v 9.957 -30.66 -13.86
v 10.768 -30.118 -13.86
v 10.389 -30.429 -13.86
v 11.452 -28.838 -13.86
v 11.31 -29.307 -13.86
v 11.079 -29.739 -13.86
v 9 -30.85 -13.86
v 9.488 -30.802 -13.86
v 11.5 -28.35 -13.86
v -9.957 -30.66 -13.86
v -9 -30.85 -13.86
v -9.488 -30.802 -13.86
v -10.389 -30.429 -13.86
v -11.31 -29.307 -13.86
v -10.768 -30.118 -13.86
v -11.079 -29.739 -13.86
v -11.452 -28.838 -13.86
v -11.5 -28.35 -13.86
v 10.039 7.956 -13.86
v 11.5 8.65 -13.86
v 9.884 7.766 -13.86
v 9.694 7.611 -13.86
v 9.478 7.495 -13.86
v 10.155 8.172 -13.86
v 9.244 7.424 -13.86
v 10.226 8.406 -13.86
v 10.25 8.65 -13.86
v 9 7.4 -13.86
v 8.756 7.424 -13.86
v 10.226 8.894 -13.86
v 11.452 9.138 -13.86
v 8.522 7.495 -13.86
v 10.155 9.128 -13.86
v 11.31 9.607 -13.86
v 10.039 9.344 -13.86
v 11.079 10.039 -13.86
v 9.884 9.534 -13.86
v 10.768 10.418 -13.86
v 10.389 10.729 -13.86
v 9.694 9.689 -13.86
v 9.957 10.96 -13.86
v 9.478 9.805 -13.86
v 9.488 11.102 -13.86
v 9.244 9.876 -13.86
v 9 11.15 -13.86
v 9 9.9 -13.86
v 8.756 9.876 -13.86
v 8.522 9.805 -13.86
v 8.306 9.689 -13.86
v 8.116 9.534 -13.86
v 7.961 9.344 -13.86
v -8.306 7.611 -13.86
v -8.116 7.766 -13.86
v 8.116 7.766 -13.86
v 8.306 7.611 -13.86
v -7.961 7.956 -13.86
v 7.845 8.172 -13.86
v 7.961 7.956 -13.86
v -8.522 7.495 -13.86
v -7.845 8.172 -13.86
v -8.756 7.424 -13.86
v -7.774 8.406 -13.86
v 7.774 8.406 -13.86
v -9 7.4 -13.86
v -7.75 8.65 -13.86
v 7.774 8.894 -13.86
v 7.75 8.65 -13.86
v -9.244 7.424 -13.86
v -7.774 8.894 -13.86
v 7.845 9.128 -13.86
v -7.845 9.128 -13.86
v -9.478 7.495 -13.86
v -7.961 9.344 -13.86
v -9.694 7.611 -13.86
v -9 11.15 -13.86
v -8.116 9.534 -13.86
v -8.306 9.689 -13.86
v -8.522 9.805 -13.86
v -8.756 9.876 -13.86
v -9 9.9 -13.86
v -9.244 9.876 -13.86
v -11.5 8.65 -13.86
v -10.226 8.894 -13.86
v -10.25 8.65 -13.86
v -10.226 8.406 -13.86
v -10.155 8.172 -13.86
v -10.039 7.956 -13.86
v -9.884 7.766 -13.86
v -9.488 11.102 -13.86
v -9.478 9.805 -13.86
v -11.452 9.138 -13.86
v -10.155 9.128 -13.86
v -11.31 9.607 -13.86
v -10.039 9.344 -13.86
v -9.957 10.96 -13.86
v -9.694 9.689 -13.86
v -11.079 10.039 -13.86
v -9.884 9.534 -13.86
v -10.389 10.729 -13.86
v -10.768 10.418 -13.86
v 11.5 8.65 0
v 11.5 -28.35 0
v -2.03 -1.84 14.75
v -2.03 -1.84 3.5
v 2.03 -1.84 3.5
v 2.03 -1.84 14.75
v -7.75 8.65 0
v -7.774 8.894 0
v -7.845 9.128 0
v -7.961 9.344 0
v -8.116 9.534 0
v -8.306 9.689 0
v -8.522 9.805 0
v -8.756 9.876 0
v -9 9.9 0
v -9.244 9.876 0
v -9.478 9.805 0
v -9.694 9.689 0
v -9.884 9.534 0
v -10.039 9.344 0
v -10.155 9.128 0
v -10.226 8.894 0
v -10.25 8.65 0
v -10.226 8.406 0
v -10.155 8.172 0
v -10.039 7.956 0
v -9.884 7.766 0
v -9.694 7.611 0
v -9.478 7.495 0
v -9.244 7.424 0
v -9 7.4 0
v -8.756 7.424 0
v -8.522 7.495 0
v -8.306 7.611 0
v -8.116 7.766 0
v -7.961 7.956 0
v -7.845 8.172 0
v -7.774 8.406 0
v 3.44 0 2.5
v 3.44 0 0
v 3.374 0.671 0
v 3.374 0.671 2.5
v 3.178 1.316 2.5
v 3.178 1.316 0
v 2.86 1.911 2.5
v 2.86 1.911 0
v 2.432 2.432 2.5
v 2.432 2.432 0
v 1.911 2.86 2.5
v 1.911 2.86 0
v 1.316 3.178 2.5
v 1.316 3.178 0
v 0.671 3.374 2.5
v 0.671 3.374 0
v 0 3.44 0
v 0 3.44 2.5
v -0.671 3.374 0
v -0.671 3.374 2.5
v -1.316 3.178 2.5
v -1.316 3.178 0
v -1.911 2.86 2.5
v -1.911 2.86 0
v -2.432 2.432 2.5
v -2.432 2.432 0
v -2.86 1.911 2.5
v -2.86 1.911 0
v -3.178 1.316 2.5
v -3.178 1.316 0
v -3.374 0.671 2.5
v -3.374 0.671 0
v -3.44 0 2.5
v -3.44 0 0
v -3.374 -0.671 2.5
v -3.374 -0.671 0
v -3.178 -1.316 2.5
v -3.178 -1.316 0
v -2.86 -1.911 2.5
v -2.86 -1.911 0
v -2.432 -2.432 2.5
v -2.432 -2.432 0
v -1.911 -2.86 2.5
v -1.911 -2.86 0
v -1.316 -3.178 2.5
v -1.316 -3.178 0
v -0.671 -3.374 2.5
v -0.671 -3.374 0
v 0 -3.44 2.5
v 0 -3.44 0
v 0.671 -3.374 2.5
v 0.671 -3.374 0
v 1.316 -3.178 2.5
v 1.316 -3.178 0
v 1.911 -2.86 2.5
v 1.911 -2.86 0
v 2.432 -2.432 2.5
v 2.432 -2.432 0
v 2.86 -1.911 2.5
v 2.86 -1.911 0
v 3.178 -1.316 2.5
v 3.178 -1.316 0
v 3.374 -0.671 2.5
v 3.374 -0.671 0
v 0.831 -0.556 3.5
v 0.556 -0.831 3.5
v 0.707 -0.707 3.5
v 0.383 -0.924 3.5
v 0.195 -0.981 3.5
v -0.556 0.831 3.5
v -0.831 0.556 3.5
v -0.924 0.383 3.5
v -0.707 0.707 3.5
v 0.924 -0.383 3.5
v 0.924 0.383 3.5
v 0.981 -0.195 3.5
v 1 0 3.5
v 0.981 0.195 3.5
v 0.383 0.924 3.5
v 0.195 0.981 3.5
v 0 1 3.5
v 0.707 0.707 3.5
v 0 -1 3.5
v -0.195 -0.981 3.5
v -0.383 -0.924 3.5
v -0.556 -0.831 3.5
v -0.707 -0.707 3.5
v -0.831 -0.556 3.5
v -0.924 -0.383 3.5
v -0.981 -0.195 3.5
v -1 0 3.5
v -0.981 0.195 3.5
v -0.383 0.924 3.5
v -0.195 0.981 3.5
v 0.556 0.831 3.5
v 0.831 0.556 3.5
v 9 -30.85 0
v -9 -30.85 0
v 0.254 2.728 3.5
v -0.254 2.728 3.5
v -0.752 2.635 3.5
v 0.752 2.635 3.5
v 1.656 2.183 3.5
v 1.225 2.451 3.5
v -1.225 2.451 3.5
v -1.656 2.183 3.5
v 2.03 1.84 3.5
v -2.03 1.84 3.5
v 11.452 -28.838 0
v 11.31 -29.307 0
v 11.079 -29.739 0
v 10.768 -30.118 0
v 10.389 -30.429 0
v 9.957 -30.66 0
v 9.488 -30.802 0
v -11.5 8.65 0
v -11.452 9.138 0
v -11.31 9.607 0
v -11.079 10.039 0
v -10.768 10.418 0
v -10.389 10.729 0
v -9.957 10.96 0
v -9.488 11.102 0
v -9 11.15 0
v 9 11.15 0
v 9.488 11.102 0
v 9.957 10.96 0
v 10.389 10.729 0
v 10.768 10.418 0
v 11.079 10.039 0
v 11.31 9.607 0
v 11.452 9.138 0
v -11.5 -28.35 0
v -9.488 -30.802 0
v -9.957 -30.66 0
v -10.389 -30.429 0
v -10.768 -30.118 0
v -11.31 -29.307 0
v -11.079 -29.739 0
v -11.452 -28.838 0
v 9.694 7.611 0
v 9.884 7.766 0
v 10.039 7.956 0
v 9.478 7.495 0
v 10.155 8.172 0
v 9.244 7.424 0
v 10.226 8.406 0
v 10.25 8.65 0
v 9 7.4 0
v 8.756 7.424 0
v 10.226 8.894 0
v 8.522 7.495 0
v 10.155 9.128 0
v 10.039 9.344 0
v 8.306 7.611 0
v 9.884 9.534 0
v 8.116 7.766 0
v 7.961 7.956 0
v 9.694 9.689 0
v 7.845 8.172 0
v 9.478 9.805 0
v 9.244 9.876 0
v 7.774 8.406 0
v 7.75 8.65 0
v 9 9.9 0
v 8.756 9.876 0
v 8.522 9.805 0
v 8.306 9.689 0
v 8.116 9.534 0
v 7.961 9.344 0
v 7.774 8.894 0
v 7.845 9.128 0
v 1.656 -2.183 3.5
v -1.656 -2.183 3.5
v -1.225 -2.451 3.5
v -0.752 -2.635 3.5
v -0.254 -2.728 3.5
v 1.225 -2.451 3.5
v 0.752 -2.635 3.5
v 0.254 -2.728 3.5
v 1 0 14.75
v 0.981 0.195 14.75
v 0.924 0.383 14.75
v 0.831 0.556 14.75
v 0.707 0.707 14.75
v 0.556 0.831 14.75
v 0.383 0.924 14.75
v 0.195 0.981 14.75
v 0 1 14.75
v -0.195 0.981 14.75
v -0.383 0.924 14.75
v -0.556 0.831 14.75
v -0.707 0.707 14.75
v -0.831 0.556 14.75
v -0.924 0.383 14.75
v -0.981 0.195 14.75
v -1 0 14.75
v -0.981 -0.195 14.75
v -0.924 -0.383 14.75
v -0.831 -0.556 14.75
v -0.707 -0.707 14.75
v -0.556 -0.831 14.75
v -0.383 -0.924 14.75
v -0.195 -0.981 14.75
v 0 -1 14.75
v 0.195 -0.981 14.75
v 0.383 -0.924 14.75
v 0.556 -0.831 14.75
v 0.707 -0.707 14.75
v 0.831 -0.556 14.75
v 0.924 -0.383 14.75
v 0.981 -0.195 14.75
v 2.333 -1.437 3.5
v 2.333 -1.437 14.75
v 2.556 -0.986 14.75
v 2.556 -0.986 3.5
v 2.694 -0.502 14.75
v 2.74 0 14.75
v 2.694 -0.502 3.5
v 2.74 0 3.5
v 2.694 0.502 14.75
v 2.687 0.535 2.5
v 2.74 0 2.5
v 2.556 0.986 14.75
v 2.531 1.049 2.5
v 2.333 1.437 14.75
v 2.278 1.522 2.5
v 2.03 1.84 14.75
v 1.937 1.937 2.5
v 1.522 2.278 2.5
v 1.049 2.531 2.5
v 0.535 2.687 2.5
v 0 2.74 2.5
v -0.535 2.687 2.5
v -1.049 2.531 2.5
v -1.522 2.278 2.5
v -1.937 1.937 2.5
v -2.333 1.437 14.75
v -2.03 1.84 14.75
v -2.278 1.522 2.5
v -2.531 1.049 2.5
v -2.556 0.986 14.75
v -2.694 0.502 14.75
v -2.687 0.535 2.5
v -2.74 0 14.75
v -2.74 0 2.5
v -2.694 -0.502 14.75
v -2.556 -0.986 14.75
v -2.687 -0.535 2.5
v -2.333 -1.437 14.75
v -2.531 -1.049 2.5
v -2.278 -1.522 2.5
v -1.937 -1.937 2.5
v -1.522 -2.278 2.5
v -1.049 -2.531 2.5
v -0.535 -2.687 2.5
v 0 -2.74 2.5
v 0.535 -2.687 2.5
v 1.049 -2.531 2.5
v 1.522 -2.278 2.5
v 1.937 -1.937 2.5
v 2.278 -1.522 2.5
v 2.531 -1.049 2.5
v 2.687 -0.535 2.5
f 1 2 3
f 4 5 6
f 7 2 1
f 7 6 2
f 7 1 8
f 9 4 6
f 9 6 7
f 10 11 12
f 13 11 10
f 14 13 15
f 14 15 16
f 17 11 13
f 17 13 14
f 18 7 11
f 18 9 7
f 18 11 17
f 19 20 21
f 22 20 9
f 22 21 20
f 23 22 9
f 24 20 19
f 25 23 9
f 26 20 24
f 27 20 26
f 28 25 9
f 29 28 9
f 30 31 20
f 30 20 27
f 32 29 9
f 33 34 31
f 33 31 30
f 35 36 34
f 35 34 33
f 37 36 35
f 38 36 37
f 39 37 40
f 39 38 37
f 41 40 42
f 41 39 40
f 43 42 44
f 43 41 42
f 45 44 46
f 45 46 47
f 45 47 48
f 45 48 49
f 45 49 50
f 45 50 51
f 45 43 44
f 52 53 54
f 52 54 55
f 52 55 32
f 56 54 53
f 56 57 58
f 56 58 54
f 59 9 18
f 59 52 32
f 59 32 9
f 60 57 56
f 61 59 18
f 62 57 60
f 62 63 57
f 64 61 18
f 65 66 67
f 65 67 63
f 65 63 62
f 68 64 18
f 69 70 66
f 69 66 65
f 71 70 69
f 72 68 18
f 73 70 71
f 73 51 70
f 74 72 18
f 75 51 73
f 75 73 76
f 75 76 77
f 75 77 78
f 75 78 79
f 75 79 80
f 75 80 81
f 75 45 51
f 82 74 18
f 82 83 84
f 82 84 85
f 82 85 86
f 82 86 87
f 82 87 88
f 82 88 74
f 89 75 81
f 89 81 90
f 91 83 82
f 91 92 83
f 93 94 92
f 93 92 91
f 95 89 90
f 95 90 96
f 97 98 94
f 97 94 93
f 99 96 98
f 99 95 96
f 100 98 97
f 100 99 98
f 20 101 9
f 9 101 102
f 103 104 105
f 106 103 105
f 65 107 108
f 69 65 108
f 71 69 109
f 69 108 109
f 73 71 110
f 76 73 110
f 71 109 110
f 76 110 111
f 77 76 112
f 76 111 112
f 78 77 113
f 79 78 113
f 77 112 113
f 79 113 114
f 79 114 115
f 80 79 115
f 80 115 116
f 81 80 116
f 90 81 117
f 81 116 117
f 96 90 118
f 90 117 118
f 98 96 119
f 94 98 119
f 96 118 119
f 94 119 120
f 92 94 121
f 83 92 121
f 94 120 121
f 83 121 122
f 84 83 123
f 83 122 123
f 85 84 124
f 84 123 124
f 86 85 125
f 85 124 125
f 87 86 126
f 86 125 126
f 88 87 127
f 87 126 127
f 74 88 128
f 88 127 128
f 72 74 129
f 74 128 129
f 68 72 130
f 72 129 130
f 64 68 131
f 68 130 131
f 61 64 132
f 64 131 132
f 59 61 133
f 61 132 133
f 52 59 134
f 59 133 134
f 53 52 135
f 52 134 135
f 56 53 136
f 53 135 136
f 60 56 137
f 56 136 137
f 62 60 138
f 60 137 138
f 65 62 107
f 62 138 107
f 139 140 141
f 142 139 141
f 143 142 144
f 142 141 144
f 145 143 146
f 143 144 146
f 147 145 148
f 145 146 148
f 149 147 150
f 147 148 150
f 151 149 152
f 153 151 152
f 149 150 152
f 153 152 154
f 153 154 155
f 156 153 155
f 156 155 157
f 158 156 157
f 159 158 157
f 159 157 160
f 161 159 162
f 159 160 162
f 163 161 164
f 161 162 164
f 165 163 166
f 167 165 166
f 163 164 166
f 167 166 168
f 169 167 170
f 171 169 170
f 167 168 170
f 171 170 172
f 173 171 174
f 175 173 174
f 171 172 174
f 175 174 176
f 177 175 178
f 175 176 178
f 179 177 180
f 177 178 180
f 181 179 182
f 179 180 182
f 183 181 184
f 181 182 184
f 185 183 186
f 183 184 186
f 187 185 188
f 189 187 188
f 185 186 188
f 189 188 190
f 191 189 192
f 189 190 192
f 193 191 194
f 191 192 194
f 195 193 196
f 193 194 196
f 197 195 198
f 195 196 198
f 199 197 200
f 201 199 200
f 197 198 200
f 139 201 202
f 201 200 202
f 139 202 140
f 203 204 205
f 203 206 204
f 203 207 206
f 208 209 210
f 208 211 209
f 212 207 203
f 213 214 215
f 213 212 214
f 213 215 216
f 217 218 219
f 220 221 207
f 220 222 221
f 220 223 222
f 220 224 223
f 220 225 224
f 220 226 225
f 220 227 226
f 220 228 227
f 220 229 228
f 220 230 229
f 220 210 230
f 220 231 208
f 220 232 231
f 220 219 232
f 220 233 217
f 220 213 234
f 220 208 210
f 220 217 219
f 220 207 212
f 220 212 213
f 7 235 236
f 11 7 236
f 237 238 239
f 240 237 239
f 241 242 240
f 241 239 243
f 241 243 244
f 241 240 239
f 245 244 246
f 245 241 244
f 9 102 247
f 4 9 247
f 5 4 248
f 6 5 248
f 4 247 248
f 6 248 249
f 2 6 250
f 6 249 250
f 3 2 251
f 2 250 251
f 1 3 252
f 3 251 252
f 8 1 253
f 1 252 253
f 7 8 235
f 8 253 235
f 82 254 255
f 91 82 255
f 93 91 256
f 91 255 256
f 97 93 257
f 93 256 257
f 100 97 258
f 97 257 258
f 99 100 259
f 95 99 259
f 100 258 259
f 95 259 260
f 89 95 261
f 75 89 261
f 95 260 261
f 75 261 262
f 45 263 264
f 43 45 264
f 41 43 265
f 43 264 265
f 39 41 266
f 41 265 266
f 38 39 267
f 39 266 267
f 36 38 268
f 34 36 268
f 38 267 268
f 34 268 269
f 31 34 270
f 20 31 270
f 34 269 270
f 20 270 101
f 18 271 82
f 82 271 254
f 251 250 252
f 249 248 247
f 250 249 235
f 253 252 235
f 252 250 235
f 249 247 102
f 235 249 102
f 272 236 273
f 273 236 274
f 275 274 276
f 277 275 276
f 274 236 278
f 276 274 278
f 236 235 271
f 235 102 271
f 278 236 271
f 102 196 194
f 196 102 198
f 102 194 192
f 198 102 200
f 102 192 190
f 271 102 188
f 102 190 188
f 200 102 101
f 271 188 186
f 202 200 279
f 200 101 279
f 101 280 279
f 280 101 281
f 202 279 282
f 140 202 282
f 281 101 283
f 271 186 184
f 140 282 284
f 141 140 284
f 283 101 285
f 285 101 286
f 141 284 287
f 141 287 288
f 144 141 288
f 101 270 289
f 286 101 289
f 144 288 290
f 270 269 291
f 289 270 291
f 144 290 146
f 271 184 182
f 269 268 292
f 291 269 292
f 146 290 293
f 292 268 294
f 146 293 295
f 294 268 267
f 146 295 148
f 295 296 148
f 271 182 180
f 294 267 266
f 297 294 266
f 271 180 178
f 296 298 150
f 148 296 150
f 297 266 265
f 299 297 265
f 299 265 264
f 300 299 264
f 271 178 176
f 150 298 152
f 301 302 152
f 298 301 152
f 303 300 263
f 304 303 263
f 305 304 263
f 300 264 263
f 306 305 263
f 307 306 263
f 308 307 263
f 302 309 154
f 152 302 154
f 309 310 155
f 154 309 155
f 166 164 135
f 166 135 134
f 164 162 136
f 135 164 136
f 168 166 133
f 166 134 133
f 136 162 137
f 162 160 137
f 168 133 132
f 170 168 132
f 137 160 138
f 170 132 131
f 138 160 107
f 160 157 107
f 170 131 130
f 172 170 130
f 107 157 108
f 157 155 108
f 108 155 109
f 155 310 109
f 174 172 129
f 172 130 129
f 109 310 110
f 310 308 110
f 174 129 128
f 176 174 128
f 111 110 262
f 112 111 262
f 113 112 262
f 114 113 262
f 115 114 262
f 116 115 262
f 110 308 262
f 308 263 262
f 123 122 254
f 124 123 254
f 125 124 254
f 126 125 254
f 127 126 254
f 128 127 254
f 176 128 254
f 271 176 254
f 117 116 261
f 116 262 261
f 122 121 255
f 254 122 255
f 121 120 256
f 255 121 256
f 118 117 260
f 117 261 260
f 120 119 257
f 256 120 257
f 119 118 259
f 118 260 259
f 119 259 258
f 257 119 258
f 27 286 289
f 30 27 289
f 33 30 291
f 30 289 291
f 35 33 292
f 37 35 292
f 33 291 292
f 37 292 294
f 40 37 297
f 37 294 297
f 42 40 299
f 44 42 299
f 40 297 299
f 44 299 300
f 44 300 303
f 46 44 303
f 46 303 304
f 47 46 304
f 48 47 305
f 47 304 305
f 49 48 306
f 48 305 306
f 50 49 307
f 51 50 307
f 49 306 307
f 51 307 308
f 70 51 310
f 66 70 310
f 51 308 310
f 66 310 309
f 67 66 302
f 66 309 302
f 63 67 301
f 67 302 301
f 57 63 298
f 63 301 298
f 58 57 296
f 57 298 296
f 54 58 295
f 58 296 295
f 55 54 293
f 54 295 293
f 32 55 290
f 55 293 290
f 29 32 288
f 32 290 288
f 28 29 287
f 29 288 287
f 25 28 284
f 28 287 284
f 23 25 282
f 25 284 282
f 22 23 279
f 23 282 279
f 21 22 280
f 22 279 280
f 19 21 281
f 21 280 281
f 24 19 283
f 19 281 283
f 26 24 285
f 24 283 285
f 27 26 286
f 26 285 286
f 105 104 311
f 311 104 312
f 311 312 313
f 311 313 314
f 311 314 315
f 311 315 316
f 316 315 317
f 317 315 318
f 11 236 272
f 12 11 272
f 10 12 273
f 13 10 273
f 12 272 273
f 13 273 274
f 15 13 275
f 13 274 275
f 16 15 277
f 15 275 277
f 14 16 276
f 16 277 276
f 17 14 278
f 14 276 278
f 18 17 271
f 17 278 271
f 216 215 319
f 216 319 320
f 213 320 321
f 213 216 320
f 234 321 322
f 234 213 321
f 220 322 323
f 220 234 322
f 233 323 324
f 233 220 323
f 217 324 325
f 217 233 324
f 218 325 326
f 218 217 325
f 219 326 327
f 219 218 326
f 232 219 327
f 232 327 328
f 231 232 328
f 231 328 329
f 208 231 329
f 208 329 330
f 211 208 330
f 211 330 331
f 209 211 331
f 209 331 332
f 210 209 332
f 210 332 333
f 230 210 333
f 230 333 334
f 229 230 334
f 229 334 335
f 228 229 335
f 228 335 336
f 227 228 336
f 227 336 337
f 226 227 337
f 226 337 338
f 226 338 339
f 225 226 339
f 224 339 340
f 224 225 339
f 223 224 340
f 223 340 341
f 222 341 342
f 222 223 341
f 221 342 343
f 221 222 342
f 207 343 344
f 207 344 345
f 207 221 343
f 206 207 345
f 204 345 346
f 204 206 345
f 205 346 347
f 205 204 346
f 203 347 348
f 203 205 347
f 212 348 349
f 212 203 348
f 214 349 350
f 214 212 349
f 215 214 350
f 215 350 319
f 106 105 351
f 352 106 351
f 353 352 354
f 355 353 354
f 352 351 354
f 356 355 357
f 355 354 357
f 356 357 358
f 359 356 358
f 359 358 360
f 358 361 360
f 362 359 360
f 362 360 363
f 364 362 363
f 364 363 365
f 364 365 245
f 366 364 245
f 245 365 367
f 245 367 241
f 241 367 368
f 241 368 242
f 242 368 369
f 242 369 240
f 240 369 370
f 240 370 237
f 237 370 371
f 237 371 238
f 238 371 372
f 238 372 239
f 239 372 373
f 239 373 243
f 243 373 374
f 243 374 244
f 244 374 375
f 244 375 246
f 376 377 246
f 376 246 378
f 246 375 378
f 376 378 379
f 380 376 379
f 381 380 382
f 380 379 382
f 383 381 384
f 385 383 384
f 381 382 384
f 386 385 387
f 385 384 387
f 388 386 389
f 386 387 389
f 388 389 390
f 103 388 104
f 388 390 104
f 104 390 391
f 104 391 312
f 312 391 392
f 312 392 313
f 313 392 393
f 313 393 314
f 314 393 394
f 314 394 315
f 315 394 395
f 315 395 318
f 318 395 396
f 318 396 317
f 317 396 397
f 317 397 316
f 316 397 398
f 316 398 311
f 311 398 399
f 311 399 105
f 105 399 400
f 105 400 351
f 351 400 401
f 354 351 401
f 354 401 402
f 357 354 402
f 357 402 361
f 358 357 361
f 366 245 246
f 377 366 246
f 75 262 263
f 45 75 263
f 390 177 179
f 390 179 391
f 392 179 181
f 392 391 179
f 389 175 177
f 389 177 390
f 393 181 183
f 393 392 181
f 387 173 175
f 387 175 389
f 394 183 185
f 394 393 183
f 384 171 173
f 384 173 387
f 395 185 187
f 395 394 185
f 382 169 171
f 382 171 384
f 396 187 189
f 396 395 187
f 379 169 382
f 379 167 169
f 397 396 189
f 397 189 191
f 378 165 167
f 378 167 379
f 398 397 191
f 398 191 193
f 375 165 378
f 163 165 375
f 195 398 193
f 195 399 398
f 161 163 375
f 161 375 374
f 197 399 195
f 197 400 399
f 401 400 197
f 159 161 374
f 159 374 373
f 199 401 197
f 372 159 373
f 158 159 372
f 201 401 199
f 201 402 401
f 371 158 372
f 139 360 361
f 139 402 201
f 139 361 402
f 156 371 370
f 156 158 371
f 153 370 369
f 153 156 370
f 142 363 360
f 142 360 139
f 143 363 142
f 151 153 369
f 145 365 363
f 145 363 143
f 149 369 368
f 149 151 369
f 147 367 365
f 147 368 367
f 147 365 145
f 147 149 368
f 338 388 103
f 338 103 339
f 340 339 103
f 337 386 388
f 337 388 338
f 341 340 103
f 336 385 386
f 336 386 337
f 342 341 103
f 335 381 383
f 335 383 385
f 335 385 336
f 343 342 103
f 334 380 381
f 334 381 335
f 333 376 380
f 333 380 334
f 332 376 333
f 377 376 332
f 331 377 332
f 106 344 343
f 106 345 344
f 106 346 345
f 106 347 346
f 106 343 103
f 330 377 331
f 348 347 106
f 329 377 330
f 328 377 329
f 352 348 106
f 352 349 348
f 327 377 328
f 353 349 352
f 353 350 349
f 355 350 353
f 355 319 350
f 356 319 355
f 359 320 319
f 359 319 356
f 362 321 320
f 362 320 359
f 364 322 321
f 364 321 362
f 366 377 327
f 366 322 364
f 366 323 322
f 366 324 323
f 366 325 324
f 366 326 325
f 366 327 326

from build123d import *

# Parameters (mm, degrees)
SKETCH1_R           = 1.25
BOSS_EXTRUDE1_DEPTH = 13.86
SKETCH1_3_R         = 3.44
BOSS_EXTRUDE2_DEPTH = 2.5
SKETCH1_4_R         = 2.74
BOSS_EXTRUDE3_DEPTH = 3.5
SKETCH1_5_R         = 1
BOSS_EXTRUDE4_DEPTH = 14.75


with BuildPart() as part:
    # Sketch1 → Boss-Extrude1 (new body)
    with BuildSketch(Plane.XY):
        with BuildLine():
            Line((9, 11.15), (-9, 11.15))
            ThreePointArc((-9, 11.15), (-10.767766953, 10.417766953), (-11.5, 8.65))
            Line((-11.5, 8.65), (-11.5, -28.35))
            ThreePointArc((-11.5, -28.35), (-10.767766953, -30.117766953), (-9, -30.85))
            Line((-9, -30.85), (9, -30.85))
            ThreePointArc((9, -30.85), (10.767766953, -30.117766953), (11.5, -28.35))
            Line((11.5, -28.35), (11.5, 8.65))
            ThreePointArc((11.5, 8.65), (10.767766953, 10.417766953), (9, 11.15))
        make_face()
        with Locations((-9, 8.65)):
            Circle(SKETCH1_R, mode=Mode.SUBTRACT)
        with Locations((9, 8.65)):
            Circle(SKETCH1_R, mode=Mode.SUBTRACT)
    extrude(amount=-BOSS_EXTRUDE1_DEPTH)

    # Sketch1<3> → Boss-Extrude2 (add)
    with BuildSketch(Plane.XY):
        Circle(SKETCH1_3_R)
    extrude(amount=BOSS_EXTRUDE2_DEPTH)

    # Sketch1<4> → Boss-Extrude3 (add)
    with BuildSketch(Plane.XY):
        Circle(SKETCH1_4_R)
    extrude(amount=BOSS_EXTRUDE3_DEPTH)

    # Sketch1<5> → Boss-Extrude4 (add)
    with BuildSketch(Plane.XY):
        with BuildLine():
            ThreePointArc((2.74, 0), (2.556417641, 0.986067362), (2.030270918, 1.84))
            Line((2.030270918, 1.84), (-2.030270918, 1.84))
            ThreePointArc((-2.030270918, 1.84), (-2.74, 0), (-2.030270918, -1.84))
            Line((-2.030270918, -1.84), (2.030270918, -1.84))
            ThreePointArc((2.030270918, -1.84), (2.556417641, -0.986067362), (2.74, 0))
        make_face()
        Circle(SKETCH1_5_R, mode=Mode.SUBTRACT)
    extrude(amount=BOSS_EXTRUDE4_DEPTH)


solid = part.part
